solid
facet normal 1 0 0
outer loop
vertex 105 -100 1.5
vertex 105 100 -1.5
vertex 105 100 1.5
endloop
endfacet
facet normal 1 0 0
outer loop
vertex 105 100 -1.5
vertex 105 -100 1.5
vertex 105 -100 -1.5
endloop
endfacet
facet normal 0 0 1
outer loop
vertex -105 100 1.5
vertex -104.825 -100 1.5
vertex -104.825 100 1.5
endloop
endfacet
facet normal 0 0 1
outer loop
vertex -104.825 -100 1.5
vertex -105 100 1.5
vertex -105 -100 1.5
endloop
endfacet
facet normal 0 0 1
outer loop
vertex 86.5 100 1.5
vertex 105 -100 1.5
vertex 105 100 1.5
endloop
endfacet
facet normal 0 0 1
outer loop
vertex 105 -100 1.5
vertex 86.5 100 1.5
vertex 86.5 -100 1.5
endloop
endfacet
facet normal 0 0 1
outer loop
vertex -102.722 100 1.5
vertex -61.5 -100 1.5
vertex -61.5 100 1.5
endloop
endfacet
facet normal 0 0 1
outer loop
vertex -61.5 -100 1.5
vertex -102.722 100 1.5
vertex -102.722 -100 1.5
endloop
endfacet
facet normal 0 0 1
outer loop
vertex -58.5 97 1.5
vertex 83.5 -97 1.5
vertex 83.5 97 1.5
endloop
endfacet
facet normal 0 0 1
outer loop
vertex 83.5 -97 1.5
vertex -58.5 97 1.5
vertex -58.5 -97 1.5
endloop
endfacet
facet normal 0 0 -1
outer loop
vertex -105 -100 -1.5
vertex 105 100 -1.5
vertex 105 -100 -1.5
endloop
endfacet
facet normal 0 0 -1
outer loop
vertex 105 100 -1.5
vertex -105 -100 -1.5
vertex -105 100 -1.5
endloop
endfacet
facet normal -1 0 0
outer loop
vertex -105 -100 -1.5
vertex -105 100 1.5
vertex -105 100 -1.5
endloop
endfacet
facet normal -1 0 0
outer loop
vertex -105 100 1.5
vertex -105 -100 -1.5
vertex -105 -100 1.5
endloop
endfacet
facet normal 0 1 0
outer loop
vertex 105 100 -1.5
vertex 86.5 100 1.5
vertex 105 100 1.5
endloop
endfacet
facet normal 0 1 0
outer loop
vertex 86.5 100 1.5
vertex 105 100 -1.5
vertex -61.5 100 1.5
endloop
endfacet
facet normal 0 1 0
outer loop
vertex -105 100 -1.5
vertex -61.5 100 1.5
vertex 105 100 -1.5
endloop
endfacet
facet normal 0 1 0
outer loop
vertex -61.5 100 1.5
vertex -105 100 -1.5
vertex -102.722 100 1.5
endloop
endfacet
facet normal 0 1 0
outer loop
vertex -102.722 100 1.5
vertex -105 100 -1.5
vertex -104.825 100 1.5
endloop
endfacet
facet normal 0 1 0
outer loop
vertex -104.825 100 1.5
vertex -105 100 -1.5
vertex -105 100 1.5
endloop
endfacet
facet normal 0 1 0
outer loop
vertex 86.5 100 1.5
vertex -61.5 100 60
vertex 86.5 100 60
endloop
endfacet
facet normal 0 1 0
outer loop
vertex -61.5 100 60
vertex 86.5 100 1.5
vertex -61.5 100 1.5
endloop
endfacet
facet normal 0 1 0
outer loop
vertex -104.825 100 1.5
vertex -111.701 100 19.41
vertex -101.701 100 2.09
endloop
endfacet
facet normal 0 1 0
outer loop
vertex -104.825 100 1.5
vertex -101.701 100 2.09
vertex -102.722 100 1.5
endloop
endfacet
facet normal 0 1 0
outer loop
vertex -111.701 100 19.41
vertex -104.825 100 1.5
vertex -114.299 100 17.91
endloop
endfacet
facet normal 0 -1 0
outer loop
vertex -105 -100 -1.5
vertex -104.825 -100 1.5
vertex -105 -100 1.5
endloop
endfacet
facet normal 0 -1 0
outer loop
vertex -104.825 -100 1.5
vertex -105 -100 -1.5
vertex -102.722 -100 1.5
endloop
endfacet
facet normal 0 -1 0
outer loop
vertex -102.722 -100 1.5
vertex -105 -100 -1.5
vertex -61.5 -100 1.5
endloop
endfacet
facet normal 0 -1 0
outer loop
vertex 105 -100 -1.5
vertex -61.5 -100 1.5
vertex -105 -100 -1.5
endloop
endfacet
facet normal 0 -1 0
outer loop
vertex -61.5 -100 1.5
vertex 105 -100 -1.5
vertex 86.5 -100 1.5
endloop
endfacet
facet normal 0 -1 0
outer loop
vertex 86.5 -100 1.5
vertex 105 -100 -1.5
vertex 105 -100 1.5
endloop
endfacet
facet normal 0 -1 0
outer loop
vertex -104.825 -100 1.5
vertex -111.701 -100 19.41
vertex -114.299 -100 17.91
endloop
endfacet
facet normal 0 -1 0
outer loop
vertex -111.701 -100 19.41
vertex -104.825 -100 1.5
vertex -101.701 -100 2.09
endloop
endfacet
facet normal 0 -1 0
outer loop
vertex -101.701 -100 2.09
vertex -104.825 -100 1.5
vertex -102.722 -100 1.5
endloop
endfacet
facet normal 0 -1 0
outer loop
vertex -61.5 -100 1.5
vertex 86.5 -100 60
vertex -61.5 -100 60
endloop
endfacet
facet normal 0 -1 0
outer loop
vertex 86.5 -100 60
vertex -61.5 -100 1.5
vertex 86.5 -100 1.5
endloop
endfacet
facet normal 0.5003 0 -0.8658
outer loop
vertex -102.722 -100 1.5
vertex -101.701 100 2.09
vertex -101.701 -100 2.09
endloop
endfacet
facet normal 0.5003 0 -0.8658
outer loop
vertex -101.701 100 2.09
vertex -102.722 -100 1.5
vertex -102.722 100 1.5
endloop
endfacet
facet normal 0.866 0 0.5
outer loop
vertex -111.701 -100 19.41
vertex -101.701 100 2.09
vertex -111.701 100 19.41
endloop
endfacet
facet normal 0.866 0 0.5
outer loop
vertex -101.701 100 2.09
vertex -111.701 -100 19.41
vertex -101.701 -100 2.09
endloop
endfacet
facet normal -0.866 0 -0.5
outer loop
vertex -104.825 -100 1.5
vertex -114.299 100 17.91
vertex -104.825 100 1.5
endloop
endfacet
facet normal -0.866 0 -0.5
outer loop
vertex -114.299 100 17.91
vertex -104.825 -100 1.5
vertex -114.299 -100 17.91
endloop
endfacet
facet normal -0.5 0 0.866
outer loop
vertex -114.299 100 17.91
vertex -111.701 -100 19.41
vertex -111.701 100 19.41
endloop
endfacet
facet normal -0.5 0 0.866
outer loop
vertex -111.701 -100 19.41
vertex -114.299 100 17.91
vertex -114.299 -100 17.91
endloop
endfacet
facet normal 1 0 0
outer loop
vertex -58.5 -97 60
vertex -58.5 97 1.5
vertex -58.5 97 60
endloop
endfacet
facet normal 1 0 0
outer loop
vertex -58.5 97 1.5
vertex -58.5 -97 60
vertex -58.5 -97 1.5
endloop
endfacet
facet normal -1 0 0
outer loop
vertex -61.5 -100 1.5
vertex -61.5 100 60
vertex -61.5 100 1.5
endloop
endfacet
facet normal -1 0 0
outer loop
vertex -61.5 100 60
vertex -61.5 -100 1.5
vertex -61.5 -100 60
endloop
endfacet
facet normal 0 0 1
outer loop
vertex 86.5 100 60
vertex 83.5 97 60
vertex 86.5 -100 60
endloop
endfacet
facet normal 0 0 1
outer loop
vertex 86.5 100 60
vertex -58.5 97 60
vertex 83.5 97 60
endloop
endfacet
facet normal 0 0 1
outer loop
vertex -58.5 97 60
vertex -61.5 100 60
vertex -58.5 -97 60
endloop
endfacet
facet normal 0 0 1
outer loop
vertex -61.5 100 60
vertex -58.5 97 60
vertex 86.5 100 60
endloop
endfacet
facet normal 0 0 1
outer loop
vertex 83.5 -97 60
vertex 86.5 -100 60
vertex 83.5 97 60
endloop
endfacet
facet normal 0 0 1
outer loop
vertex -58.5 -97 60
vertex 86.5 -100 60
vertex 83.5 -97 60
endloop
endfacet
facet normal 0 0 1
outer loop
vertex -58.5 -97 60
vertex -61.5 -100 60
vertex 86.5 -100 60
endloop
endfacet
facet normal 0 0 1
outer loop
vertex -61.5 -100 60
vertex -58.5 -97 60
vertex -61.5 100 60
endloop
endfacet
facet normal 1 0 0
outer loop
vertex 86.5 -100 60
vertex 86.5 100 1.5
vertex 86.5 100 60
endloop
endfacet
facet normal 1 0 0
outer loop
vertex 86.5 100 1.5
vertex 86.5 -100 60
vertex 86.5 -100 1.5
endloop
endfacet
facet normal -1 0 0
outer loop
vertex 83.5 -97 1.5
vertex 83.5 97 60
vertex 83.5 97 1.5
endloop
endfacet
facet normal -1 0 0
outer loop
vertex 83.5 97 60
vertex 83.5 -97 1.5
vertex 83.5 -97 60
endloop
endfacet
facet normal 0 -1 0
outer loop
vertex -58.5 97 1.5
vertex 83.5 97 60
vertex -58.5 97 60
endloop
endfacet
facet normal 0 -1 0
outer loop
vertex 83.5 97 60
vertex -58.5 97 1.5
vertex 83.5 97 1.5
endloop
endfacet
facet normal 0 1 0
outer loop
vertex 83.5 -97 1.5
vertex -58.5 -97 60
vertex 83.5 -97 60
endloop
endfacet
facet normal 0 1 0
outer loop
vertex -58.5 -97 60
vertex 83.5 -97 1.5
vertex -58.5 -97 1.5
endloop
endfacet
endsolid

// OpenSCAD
//the box
cube(size = [210,200,3], center = true);
translate(v = [-108, 0, 10]) rotate(a=[0,60,0])  cube(size = [20,200,3], center = true);
translate(v = [-60, 0, 30]) rotate(a=[0,90,0])  cube(size = [60,200,3], center = true);
translate(v = [85, 0, 30]) rotate(a=[0,90,0])  cube(size = [60,200,3], center = true);
translate(v = [14, 98.5, 30]) rotate(a=[90,0,0])  cube(size = [145,60,3], center = true);
translate(v = [14, -98.5, 30]) rotate(a=[90,0,0])  cube(size = [145,60,3], center = true);

//lianjie bufen 
translate(v = [14, -98.5, 30]) rotate(a=[90,0,0])  cube(size = [145,60,3], center = true);
